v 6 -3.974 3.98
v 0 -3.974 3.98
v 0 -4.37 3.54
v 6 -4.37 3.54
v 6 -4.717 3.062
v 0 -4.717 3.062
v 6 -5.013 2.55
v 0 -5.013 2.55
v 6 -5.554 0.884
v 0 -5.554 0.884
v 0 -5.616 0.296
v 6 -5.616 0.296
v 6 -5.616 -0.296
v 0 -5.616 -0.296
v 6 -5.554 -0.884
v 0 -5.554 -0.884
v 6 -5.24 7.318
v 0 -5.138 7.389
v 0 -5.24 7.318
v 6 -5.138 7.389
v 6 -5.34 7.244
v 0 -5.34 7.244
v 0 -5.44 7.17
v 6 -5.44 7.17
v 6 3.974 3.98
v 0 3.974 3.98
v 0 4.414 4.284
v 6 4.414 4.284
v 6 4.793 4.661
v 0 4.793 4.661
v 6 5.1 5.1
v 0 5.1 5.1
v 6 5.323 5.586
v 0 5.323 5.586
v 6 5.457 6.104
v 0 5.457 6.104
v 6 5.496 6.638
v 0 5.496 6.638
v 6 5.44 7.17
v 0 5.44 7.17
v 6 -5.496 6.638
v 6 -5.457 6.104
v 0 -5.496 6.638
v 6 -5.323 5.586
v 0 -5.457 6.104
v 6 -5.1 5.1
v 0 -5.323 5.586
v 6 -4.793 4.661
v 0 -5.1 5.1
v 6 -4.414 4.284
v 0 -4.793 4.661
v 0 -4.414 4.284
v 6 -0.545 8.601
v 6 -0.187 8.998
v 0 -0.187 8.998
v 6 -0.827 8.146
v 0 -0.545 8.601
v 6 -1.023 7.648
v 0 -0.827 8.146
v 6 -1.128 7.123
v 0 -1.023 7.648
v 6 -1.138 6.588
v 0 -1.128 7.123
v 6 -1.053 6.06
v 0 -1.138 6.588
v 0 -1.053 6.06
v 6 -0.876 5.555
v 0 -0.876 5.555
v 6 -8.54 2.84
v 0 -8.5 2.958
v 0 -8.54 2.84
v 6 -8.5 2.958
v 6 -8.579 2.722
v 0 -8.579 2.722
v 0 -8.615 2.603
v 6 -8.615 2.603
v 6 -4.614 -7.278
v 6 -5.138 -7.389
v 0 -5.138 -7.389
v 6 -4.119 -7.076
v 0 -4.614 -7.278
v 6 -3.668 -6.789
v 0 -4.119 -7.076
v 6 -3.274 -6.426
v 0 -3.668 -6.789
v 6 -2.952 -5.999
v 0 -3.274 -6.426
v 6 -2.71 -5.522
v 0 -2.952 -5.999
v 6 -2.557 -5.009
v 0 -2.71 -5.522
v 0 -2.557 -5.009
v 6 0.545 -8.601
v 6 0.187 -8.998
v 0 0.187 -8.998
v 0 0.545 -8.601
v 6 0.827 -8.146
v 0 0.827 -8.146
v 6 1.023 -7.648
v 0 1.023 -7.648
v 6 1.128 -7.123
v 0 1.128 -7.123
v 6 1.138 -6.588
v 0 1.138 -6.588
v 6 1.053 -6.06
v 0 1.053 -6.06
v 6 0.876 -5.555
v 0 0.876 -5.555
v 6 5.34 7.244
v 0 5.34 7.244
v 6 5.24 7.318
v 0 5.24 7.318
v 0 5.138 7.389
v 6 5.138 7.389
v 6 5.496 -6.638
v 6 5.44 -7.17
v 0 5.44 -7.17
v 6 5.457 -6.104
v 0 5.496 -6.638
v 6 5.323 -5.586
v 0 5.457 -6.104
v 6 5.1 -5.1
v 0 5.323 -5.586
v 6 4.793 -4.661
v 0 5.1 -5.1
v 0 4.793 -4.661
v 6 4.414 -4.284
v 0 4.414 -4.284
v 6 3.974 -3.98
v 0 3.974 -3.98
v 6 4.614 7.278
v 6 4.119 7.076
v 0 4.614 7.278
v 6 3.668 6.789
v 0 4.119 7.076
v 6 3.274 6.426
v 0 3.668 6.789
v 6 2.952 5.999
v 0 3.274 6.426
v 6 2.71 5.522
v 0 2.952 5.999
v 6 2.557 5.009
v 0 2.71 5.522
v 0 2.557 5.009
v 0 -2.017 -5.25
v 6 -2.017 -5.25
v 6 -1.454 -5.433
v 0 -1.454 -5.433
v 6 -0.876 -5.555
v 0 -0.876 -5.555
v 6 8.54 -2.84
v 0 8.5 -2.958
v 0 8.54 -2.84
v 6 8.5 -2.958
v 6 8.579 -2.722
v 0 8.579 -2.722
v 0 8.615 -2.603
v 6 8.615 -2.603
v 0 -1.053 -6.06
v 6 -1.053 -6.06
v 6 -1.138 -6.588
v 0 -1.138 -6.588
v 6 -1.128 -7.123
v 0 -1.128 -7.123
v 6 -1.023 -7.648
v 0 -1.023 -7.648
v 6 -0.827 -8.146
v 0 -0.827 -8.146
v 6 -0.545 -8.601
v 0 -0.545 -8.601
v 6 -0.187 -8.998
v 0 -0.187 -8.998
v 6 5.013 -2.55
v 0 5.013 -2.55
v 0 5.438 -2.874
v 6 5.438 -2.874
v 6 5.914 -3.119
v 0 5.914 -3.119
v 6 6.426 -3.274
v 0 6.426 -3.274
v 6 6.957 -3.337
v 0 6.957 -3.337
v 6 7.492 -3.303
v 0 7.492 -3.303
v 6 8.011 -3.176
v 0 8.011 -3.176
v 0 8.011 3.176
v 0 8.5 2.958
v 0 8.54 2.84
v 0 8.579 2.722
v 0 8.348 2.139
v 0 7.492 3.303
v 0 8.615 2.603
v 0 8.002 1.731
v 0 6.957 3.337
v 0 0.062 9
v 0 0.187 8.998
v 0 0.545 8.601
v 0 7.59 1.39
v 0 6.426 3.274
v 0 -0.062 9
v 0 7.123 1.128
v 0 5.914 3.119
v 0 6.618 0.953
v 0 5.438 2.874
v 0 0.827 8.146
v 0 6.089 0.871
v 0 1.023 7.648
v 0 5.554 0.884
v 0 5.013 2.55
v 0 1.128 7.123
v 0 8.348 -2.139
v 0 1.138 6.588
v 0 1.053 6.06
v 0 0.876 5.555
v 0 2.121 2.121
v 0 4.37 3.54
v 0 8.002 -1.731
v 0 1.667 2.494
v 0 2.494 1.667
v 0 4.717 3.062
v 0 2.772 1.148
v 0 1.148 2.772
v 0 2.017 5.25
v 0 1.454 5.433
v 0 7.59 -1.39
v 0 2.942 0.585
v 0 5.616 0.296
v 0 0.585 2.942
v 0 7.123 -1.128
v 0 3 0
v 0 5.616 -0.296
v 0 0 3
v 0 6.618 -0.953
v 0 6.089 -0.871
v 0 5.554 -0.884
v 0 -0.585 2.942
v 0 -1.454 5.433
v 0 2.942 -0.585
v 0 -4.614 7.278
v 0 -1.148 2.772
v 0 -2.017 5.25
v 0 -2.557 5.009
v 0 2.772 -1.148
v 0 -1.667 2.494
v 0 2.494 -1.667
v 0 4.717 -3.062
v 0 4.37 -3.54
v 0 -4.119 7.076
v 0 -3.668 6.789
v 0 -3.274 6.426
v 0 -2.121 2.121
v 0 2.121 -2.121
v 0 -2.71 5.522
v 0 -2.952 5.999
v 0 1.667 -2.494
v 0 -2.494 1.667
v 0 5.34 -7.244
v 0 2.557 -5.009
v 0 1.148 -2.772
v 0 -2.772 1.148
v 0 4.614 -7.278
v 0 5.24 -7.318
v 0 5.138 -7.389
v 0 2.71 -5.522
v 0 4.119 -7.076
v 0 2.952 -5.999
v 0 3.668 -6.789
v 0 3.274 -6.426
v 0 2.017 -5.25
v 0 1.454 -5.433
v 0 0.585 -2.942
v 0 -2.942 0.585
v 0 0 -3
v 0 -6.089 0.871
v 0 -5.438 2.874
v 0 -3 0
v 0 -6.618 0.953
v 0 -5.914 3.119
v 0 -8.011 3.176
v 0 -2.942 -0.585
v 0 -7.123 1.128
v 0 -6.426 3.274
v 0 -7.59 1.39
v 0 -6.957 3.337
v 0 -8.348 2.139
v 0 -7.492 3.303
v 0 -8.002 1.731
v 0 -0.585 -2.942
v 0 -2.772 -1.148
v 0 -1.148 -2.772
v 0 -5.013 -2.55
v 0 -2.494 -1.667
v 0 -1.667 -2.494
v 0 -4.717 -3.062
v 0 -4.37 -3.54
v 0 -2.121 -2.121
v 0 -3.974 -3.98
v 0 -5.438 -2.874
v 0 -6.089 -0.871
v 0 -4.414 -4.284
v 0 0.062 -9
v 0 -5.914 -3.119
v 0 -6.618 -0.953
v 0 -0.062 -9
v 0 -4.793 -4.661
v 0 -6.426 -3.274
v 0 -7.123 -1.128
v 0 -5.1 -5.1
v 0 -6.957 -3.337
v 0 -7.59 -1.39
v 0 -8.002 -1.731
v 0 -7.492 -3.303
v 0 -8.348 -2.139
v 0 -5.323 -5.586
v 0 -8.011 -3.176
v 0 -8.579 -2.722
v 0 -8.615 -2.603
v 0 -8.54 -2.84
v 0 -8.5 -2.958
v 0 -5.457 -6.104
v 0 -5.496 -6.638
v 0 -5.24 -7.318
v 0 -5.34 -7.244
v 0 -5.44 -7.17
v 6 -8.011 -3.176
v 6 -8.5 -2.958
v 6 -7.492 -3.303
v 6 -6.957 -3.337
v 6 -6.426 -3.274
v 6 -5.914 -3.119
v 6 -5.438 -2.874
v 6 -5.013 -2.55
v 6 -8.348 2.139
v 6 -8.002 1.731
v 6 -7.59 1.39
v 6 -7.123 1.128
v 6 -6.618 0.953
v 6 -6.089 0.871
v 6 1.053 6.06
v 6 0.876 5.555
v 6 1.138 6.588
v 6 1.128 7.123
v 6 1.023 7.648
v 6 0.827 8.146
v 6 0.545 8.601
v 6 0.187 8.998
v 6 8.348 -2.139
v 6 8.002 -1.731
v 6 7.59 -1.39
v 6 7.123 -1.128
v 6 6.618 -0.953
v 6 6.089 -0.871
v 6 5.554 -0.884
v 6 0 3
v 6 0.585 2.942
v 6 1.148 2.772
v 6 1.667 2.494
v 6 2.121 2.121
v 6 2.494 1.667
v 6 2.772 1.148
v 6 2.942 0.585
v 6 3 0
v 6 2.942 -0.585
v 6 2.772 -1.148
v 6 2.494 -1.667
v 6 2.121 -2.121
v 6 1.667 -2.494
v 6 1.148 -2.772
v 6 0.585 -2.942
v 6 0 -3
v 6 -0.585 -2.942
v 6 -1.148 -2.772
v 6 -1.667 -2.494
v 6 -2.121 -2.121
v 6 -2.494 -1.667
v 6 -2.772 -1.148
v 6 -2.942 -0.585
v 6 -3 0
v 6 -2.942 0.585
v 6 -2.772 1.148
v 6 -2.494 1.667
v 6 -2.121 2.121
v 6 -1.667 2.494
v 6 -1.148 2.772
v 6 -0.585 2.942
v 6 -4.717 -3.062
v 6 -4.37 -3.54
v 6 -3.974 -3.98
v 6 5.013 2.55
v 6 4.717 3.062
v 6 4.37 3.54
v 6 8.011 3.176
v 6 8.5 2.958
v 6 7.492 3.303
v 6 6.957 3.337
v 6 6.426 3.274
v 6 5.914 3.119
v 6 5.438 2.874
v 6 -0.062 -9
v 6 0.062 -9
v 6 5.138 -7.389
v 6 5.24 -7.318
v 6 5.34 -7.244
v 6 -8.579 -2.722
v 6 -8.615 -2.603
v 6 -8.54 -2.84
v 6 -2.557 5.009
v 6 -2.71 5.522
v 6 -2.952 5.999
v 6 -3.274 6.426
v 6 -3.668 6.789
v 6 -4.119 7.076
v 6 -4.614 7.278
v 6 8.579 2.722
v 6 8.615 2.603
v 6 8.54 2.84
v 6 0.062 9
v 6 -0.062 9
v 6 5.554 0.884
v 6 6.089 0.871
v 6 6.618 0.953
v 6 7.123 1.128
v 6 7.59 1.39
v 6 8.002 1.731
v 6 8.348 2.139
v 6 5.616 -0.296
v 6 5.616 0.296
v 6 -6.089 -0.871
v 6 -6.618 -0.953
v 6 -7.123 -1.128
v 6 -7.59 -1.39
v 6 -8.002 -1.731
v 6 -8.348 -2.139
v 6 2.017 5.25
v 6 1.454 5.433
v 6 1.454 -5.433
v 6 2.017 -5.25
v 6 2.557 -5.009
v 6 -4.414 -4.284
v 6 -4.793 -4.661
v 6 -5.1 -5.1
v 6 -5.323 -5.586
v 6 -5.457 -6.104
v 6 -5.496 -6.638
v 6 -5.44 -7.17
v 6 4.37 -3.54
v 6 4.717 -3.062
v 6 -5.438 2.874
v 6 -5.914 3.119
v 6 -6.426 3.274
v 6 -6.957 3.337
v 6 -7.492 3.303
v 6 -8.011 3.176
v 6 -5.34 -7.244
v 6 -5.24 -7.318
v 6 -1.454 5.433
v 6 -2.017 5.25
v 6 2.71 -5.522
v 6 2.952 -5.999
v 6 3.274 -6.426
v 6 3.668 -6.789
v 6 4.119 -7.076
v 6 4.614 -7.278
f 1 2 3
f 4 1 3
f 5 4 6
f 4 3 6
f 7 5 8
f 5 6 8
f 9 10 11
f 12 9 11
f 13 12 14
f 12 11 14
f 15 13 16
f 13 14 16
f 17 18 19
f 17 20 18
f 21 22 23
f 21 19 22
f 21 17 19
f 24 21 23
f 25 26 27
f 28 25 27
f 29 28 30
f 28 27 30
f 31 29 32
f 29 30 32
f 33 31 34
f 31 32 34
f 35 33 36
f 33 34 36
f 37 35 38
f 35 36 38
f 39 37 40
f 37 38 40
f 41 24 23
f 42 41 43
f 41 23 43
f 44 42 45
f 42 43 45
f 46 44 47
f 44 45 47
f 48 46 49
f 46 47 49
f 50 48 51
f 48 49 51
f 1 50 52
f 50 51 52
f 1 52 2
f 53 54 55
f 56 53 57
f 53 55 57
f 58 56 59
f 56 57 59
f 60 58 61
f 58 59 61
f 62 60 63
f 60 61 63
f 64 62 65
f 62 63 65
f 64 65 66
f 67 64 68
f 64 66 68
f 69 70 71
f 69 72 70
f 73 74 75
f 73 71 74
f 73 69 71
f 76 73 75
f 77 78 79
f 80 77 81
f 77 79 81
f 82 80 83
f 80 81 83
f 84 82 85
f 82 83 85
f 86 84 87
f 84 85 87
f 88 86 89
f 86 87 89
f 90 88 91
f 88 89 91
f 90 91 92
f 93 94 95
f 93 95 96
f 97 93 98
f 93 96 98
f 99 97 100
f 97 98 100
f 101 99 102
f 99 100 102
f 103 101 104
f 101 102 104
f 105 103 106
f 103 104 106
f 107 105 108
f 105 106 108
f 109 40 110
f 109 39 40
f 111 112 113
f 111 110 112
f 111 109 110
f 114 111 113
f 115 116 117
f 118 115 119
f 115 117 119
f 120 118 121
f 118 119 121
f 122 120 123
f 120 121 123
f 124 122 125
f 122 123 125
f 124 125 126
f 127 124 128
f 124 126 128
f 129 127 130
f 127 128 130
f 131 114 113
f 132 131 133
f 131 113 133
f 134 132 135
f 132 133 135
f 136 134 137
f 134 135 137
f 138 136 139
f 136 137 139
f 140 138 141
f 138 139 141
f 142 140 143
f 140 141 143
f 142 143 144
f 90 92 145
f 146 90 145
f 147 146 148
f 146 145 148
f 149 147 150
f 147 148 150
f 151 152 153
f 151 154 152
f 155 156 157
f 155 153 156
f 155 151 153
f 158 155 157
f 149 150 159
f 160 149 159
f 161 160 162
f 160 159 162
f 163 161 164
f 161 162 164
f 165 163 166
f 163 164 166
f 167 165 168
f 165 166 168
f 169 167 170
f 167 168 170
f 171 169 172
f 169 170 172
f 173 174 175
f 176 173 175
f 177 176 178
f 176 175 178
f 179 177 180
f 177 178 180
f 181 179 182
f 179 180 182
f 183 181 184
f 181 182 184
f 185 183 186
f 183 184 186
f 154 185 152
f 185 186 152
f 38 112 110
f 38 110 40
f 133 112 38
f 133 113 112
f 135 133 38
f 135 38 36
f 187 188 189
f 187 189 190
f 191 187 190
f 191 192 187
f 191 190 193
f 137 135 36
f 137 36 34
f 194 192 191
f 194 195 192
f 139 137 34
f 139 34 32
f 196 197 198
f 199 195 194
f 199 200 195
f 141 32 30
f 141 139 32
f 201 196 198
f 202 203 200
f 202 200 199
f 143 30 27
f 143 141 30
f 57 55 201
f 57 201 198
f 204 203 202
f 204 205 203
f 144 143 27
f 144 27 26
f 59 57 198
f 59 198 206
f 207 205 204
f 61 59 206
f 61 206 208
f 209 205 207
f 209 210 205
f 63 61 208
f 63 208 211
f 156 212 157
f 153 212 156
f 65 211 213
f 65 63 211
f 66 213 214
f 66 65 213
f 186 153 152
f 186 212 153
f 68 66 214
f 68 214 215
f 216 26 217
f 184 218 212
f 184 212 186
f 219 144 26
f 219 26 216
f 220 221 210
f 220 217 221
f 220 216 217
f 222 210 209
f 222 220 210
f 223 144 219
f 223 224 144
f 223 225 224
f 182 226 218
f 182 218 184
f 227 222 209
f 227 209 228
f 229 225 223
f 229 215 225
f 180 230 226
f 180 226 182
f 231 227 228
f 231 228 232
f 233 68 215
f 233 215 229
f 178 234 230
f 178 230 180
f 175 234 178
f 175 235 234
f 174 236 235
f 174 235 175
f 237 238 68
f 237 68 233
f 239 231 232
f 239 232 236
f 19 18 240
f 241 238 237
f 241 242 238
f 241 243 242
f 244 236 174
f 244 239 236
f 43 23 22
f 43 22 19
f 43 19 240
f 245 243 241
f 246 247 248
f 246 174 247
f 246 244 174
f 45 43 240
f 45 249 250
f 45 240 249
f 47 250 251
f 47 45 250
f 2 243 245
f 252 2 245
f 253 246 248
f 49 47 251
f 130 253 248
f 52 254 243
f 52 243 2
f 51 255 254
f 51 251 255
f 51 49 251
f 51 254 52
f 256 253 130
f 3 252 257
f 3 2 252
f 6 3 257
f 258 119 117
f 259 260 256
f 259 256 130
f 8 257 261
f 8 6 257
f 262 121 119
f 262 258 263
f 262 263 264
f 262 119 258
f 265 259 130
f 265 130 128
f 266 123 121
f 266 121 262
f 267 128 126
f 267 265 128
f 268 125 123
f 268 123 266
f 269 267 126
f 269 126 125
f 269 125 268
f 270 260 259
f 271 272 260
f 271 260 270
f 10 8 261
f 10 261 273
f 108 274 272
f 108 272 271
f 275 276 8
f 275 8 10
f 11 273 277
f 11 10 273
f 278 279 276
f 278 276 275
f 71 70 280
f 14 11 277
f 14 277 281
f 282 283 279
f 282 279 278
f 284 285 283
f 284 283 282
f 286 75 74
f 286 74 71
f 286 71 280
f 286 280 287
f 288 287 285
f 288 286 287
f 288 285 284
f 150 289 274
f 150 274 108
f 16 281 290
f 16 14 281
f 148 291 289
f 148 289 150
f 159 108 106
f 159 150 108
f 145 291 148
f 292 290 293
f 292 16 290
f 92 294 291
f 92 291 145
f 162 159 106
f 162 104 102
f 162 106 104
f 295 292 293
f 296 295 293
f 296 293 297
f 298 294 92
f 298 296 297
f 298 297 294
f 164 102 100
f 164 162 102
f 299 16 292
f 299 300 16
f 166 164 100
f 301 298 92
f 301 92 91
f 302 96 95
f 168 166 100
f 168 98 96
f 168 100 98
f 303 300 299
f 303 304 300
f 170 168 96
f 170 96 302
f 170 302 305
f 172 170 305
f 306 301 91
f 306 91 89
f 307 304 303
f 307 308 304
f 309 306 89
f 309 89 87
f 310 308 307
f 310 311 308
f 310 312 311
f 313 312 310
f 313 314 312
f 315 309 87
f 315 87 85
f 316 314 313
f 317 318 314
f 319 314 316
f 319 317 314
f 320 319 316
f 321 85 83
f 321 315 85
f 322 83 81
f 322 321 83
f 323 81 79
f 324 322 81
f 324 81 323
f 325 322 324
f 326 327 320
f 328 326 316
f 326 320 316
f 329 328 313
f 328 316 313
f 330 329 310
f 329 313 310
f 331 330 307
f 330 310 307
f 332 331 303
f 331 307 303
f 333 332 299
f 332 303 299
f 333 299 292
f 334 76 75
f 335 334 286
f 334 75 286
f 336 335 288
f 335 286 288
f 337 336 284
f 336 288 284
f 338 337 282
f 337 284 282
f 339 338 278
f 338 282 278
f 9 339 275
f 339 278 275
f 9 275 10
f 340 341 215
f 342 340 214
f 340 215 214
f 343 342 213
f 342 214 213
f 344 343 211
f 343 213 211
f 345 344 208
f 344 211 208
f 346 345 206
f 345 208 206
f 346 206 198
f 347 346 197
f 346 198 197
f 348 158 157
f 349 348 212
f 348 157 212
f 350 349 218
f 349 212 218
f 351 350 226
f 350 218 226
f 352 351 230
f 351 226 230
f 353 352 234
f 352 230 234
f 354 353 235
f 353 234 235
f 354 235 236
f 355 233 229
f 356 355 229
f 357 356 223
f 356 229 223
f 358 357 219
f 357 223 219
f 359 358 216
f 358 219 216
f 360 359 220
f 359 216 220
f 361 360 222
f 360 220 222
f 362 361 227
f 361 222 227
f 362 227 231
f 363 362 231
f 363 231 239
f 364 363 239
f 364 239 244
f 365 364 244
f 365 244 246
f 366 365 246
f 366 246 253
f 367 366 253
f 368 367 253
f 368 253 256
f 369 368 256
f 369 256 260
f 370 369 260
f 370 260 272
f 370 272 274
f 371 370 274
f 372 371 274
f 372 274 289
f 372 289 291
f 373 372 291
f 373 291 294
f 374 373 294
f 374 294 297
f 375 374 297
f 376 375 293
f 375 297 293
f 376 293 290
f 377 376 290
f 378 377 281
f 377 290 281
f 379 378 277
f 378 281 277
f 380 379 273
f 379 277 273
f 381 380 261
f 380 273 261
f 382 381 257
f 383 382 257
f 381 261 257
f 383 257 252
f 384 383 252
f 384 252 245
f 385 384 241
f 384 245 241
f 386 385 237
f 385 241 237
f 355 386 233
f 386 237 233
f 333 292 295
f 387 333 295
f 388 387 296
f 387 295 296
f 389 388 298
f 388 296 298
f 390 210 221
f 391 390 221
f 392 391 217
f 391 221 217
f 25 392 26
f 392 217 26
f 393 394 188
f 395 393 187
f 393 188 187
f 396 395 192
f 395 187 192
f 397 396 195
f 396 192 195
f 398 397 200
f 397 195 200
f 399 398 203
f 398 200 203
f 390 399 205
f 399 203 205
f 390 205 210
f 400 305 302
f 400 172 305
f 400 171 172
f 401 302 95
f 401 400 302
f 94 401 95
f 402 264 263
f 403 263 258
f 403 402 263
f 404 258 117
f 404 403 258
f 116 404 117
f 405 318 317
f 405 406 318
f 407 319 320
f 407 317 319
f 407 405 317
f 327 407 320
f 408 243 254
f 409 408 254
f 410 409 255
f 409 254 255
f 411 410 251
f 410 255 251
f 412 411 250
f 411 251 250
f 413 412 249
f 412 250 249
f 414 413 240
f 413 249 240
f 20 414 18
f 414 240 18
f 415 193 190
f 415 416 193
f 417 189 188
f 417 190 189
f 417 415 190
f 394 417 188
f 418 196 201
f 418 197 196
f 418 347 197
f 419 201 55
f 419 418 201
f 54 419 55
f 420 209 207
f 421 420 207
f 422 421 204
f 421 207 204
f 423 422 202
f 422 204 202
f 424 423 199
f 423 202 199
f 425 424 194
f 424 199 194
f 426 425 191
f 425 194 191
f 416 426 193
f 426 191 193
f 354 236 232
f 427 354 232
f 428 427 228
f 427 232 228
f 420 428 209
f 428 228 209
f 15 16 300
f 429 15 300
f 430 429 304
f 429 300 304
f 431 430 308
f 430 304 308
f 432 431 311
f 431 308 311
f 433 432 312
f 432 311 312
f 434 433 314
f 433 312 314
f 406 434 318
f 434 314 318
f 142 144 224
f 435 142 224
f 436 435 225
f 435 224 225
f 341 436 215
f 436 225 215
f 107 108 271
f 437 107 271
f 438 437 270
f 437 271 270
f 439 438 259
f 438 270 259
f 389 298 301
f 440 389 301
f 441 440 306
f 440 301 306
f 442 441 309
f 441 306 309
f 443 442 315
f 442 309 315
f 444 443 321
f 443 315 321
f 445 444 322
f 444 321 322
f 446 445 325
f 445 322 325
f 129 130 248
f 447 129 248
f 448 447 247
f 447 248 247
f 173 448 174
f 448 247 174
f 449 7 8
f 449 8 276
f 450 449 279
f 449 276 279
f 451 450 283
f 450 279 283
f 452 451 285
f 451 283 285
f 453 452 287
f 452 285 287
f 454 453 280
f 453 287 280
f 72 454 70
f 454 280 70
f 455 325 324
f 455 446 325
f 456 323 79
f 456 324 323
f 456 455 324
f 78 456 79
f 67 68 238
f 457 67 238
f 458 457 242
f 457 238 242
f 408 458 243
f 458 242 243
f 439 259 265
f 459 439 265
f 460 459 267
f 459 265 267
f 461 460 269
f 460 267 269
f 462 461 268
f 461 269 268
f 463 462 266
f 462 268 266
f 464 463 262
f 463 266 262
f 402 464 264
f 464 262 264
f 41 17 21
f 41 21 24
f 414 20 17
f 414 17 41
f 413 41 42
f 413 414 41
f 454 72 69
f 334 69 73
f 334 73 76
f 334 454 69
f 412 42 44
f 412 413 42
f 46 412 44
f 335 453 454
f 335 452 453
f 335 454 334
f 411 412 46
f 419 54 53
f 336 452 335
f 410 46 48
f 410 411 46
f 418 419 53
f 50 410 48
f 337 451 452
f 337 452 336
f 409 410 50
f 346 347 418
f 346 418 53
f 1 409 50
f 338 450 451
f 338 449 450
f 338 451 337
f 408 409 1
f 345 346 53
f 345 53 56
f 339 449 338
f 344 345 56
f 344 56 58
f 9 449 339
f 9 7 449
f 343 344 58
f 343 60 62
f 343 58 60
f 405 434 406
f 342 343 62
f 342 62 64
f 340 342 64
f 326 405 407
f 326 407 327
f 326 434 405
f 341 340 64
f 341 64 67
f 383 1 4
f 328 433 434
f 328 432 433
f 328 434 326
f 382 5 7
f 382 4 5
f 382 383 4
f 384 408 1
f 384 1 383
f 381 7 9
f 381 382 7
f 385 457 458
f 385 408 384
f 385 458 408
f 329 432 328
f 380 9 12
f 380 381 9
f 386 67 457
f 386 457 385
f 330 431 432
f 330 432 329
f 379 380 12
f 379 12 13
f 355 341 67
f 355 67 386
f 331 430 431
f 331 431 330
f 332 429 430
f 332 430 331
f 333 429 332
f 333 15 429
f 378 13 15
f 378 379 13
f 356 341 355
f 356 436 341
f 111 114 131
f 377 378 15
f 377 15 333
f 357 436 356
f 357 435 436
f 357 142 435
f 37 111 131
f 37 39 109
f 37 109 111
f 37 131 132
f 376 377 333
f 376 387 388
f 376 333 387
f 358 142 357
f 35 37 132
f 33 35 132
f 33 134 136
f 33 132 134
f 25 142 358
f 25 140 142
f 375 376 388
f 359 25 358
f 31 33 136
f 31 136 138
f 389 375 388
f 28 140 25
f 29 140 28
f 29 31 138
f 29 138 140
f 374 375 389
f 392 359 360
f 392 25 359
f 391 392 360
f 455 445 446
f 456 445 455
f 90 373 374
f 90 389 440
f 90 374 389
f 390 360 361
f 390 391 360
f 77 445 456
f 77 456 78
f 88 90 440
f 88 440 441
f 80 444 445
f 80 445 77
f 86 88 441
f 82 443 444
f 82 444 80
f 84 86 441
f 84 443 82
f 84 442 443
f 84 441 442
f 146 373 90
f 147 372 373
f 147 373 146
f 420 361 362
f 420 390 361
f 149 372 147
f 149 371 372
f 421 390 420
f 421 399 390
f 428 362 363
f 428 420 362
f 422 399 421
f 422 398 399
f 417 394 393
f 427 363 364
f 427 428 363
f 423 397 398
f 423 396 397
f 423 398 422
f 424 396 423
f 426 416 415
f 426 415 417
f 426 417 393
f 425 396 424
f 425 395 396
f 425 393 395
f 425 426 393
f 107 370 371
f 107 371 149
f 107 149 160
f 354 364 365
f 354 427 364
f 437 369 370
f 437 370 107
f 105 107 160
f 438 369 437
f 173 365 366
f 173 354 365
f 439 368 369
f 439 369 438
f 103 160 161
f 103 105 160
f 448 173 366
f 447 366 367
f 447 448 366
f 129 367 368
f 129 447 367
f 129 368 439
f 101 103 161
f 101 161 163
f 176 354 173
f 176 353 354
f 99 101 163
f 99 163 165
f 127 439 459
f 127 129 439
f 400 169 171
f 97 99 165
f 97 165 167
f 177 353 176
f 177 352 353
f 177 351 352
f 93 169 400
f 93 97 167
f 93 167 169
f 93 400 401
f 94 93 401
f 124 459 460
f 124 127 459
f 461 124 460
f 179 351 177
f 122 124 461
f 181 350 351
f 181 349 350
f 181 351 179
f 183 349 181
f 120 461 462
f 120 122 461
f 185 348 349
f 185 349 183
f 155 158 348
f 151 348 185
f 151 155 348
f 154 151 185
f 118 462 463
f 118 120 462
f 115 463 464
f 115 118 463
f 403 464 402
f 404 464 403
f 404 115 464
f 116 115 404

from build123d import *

# Parameters (mm, degrees)
BASPROSKE_W        = 12
BASPROSKE_H        = 9
TOOTHCUT_DEPTH     = 18.492855685
TEETHCUTS_COUNT    = 10
TEETHCUTS_ANGLE    = 324
BORSKE_R           = 0.4
BORE_DEPTH         = 50.0000508
SKETCH1_R          = 3
SKETCH1_R_2        = 0.4
CUT_EXTRUDE2_DEPTH = 18.298122882
SKETCH2_R          = 20.440784698
CUT_EXTRUDE3_DEPTH = 6


with BuildPart() as part:
    # BasProSke → Base-Revolve (revolve)
    with BuildSketch(Plane(origin=(0, 0, 0), x_dir=(1, 0, 0), z_dir=(0, 1, 0)), mode=Mode.PRIVATE) as base_revolve_sk:
        with Locations((6, 4.5)):
            Rectangle(BASPROSKE_W, BASPROSKE_H)
    revolve(base_revolve_sk.sketch.rotate(Axis((-10, 0, 0), (1, 0, 0)), 180), axis=Axis((-10, 0, 0), (1, 0, 0)))

    # TooCutSke → ToothCut (cut, through all)
    with BuildSketch(Plane(origin=(0, 0, 0), x_dir=(0, 0, -1), z_dir=(1, 0, 0))):
        with BuildLine():
            ThreePointArc((0.883878355, 5.554109745), (0, 5.624), (-0.883878355, 5.554109745))
            ThreePointArc((-0.883878355, 5.554109745), (-1.258245767, 7.379188248), (-2.637816971, 8.631324741))
            ThreePointArc((-2.637816971, 8.631324741), (0, 9.0254), (2.637816971, 8.631324741))
            ThreePointArc((2.637816971, 8.631324741), (1.258245767, 7.379188248), (0.883878355, 5.554109745))
        make_face()
    toothcut = extrude(amount=TOOTHCUT_DEPTH, mode=Mode.SUBTRACT)

    # TeethCuts: ToothCut ×10 about axis
    teethcuts_axis = Axis((-10, 0, 0), (1, 0, 0))
    for i in range(1, TEETHCUTS_COUNT):
        add(toothcut.rotate(teethcuts_axis, i * TEETHCUTS_ANGLE / (TEETHCUTS_COUNT - 1)), mode=Mode.SUBTRACT)

    # BorSke → Bore (cut, symmetric)
    with BuildSketch(Plane(origin=(0, 0, 0), x_dir=(0, 0, -1), z_dir=(1, 0, 0))):
        with Locations(Location((0, 0, 0), (0, 0, 180))):
            Circle(BORSKE_R)
    extrude(amount=BORE_DEPTH, both=True, mode=Mode.SUBTRACT)

    # Sketch1 → Cut-Extrude2 (cut, through all)
    with BuildSketch(Plane.ZY):
        Circle(SKETCH1_R)
        Circle(SKETCH1_R_2, mode=Mode.SUBTRACT)
    extrude(amount=-CUT_EXTRUDE2_DEPTH, mode=Mode.SUBTRACT)

    # Sketch2 → Cut-Extrude3 (cut)
    with BuildSketch(Plane(origin=(12, 0, 0), x_dir=(0, 0, -1), z_dir=(1, 0, 0))):
        Circle(SKETCH2_R)
    extrude(amount=-CUT_EXTRUDE3_DEPTH, mode=Mode.SUBTRACT)


solid = part.part
